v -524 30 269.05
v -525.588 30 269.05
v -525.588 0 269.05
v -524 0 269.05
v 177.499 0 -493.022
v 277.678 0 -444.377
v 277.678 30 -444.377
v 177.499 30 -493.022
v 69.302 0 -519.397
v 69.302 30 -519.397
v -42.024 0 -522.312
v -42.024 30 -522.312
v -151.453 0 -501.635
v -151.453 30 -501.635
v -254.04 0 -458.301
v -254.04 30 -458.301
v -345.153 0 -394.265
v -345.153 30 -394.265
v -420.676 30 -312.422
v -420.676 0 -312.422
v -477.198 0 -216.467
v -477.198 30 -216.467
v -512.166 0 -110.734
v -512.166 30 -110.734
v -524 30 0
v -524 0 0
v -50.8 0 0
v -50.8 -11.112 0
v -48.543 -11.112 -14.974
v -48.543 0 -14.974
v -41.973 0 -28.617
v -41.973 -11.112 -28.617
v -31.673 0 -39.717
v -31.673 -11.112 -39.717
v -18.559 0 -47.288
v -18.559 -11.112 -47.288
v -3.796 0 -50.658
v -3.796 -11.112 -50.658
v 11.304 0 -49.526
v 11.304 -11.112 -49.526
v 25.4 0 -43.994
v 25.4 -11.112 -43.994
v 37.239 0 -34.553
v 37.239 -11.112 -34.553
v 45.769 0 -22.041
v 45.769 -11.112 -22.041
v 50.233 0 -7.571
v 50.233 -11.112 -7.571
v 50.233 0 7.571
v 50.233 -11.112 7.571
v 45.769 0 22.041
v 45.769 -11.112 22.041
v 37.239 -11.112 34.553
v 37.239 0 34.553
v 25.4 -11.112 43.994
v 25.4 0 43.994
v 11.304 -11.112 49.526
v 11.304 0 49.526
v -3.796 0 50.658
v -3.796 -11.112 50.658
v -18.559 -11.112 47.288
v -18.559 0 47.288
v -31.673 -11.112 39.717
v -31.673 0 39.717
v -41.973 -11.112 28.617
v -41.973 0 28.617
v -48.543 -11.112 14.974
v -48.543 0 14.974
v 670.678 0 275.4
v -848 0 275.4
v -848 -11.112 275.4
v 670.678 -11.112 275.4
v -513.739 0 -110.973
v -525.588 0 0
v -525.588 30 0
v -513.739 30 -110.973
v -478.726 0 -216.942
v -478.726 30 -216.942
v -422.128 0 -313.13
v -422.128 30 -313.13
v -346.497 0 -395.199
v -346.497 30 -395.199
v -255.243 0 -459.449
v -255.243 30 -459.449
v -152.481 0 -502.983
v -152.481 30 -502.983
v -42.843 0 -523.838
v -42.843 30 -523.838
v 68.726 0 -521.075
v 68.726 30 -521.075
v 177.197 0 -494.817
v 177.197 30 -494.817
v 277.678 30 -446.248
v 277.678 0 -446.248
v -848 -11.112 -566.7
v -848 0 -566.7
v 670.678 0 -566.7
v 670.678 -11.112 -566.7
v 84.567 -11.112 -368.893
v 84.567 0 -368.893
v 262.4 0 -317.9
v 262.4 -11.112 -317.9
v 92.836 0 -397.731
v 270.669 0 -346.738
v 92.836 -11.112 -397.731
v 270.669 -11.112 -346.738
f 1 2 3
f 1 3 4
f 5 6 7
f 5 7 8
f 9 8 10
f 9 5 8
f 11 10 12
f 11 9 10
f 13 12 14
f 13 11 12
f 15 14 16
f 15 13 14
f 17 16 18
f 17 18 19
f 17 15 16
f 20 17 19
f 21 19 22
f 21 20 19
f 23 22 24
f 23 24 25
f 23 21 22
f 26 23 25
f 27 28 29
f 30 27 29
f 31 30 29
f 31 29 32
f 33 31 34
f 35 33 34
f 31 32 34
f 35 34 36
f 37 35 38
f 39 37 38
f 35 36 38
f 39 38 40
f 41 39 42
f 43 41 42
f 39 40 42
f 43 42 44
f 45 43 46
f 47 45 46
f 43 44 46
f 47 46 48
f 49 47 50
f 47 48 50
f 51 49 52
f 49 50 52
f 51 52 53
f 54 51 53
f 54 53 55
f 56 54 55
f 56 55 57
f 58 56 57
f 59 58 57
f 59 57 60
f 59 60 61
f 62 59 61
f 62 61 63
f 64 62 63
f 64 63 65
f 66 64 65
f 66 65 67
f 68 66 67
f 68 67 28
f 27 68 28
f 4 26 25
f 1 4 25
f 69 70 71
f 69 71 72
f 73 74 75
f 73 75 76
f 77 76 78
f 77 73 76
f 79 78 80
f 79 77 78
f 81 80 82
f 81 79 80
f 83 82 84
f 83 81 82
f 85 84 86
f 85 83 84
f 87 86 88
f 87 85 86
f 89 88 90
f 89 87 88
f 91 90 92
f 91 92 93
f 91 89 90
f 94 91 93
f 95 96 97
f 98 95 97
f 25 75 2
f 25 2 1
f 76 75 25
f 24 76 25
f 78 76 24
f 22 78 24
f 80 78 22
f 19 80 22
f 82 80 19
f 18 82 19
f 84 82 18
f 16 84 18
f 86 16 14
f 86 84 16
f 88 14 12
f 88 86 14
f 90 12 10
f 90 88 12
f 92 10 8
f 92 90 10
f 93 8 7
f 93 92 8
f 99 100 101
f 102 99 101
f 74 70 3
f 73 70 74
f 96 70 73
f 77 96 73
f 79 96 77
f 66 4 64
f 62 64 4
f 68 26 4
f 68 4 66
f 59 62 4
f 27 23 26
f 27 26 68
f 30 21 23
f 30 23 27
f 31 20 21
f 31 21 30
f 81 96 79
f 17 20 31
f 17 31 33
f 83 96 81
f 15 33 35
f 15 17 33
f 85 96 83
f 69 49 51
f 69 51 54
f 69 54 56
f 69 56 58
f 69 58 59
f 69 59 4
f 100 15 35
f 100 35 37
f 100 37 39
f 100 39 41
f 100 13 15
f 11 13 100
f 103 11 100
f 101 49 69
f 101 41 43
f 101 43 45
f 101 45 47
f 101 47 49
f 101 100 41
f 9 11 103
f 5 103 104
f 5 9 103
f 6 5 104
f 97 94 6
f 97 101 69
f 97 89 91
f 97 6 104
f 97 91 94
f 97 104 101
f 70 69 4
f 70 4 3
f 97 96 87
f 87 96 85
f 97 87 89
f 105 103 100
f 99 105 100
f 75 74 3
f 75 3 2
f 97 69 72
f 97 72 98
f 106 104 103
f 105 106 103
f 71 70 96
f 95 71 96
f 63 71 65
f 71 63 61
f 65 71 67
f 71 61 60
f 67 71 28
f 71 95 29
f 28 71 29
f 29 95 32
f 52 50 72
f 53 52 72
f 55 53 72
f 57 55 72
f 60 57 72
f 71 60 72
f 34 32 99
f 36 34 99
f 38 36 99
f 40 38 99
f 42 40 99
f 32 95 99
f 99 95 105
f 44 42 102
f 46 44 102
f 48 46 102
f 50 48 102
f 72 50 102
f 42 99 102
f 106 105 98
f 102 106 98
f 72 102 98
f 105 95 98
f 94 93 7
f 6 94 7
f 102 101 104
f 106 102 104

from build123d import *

# Parameters (mm, degrees)
BOSS_EXTRUDE1_DEPTH    = 30
SKETCH4_W              = 1518.677694458
SKETCH4_H              = 842.1
BOSS_EXTRUDE2_DEPTH    = 11.1125
F_20_0MM_DOWEL_HOLE1_D = 101.6
SKETCH8_W              = 1.5875
SKETCH8_H              = 30
BOSS_EXTRUDE3_DEPTH    = 269.05
CUT_EXTRUDE1_DEPTH     = 1021.368996981


with BuildPart() as part:
    # Sketch3 → Boss-Extrude1 (new body)
    with BuildSketch(Plane(origin=(0, 0, 0), x_dir=(1, 0, 0), z_dir=(0, 1, 0))):
        with BuildLine():
            Line((-524, 0), (-525.5875, 0))
            ThreePointArc((-525.5875, 0), (-255.243310314, 459.448661655), (277.677694458, 446.248045549))
            Line((277.677694458, 446.248045549), (277.677694458, 444.377202386))
            ThreePointArc((277.677694458, 444.377202386), (-254.040241009, 458.300726541), (-524, 0))
        make_face()
    extrude(amount=BOSS_EXTRUDE1_DEPTH)

    # Sketch4 → Boss-Extrude2 (add)
    with BuildSketch(Plane(origin=(0, 0, 0), x_dir=(1, 0, 0), z_dir=(0, 1, 0))):
        with Locations((-88.661152771, 145.65)):
            Rectangle(SKETCH4_W, SKETCH4_H)
    extrude(amount=-BOSS_EXTRUDE2_DEPTH)

    # Ø20.0mm Dowel Hole1 (through all)
    with Locations(Plane(origin=(0, 0, 0), x_dir=(1, 0, 0), z_dir=(0, 1, 0))):
        with Locations((0, 0)):
            Hole(F_20_0MM_DOWEL_HOLE1_D / 2)

    # Sketch8 → Boss-Extrude3 (add)
    with BuildSketch(Plane.XY):
        with Locations((-524.79375, 15)):
            Rectangle(SKETCH8_W, SKETCH8_H)
    extrude(amount=BOSS_EXTRUDE3_DEPTH)

    # Sketch9 → Cut-Extrude1 (cut, through all)
    with BuildSketch(Plane(origin=(0, 0, 0), x_dir=(1, 0, 0), z_dir=(0, 1, 0))):
        Polygon((270.669120675, 346.737850878), (92.835706926, 397.730761704), (84.566586251, 368.892910826), (262.4, 317.9), align=None)
    extrude(amount=-CUT_EXTRUDE1_DEPTH, mode=Mode.SUBTRACT)


solid = part.part
